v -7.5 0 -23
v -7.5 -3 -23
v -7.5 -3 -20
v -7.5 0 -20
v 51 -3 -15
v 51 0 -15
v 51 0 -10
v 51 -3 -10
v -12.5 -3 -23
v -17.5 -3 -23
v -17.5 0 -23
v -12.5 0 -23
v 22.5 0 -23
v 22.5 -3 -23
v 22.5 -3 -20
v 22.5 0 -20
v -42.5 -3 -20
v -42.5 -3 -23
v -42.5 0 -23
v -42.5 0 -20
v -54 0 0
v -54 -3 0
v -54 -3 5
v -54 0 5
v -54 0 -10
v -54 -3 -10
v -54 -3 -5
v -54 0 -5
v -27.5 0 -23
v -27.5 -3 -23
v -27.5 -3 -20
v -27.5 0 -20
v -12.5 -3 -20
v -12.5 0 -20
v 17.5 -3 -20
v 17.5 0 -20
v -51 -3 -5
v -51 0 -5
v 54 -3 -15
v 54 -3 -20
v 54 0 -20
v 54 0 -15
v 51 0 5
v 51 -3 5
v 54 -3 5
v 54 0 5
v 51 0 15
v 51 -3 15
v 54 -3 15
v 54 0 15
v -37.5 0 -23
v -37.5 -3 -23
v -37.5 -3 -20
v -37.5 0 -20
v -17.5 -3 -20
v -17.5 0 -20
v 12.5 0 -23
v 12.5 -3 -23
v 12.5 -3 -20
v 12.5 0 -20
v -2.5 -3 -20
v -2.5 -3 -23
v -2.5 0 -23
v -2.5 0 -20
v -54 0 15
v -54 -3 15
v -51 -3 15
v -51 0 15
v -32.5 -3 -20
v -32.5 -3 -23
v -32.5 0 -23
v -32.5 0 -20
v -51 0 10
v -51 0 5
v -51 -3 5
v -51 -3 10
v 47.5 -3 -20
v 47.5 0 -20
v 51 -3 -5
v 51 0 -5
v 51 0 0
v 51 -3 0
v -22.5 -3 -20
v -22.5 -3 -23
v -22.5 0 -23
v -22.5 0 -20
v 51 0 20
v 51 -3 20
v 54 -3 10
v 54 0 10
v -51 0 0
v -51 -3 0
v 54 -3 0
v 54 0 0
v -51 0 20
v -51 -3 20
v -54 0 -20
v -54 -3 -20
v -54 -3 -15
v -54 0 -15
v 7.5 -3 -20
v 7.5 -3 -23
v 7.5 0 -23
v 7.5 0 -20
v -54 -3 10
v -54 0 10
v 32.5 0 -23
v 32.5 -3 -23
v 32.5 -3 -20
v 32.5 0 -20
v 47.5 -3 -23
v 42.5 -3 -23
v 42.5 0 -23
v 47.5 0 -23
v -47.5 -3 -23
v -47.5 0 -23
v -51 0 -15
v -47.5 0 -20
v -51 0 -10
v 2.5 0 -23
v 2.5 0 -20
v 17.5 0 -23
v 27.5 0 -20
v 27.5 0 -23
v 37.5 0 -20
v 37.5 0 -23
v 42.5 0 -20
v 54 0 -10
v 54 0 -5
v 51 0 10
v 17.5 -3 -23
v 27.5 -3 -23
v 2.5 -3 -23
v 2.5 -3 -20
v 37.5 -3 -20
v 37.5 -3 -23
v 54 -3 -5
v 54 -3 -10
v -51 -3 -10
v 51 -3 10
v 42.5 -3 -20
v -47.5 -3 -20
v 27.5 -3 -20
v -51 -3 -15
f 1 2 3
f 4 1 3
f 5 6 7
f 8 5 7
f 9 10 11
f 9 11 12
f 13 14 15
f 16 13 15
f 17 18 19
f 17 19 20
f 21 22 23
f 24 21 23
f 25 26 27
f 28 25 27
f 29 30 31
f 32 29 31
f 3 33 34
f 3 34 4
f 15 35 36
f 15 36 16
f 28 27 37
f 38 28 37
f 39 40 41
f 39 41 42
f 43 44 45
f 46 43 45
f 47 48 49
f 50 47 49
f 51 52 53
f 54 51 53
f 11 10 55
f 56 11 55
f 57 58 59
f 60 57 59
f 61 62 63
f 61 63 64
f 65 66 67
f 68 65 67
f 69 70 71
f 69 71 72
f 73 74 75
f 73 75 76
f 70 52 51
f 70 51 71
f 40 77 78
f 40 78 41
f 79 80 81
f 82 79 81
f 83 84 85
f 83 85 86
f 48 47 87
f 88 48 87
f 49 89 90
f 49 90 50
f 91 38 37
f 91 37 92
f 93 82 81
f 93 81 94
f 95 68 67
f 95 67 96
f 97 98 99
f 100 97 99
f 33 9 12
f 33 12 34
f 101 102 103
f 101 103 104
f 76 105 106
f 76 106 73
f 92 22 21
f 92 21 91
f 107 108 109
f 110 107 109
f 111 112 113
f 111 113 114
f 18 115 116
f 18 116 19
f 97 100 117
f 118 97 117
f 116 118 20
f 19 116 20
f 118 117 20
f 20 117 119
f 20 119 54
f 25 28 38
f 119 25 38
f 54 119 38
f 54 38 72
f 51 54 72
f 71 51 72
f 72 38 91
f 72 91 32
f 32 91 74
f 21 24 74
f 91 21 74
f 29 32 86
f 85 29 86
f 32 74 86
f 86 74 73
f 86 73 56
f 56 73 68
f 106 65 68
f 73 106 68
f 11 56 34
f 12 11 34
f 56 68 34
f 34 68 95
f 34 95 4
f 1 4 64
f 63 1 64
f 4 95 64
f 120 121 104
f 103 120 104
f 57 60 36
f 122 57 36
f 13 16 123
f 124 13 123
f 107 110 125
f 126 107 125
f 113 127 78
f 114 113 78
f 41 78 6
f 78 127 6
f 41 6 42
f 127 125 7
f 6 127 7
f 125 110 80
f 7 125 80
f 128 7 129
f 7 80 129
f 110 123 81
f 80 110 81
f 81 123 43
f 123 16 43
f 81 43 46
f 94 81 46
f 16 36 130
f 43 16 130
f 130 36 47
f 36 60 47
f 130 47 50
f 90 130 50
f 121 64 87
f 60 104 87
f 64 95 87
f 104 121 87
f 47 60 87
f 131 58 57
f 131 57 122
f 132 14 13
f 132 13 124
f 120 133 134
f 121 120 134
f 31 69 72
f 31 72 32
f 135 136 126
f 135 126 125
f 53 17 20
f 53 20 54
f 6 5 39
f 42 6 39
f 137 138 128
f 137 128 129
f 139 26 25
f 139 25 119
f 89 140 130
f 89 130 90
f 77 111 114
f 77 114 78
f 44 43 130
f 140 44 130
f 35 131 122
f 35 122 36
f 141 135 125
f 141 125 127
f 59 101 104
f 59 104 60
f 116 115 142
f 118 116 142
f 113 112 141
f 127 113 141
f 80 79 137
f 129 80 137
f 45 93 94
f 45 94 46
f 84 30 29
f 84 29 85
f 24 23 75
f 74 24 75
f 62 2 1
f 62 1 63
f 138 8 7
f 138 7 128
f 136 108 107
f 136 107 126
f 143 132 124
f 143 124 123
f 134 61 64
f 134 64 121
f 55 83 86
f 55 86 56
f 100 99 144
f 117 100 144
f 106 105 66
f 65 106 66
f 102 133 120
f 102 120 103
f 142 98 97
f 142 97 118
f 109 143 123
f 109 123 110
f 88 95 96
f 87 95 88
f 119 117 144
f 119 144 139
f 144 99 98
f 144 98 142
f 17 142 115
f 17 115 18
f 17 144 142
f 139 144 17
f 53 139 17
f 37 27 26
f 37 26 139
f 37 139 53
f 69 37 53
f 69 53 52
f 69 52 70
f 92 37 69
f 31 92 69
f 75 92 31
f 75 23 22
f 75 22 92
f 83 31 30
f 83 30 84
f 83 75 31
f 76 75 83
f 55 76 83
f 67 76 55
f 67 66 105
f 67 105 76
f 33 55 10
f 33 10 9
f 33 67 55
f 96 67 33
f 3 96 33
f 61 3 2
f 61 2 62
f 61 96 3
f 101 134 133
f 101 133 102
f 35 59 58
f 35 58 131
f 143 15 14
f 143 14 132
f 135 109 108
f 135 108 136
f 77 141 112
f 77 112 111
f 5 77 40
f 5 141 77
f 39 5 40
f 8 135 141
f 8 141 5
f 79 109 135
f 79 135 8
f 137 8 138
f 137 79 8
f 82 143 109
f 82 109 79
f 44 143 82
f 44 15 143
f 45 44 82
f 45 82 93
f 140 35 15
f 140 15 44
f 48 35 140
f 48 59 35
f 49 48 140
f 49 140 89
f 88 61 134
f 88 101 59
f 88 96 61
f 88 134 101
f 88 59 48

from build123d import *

# Parameters (mm, degrees)
F0_W     = 102
F0_H     = 40
F1_DEPTH = 3
F2_W     = 3
F2_H     = 5
F3_DEPTH = 3
F4_W     = 5
F4_H     = 3
F5_DEPTH = 3


with BuildPart() as f1:
    # F0 (on Front) → F1 (new body)
    with BuildSketch(Plane.XZ):
        Rectangle(F0_W, F0_H)
    extrude(amount=F1_DEPTH)

    # F2 (on face) → F3 (join)
    with BuildSketch(Plane.XZ.offset(3)):
        with Locations((-52.5, -17.5)):
            Rectangle(F2_W, F2_H)
        with Locations((-52.5, -7.5)):
            Rectangle(F2_W, F2_H)
        with Locations((-52.5, 2.5)):
            Rectangle(F2_W, F2_H)
        with Locations((-52.5, 12.5)):
            Rectangle(F2_W, F2_H)
        with Locations((52.5, -7.5)):
            Rectangle(F2_W, F2_H)
        with Locations((52.5, -17.5)):
            Rectangle(F2_W, F2_H)
        with Locations((52.5, 12.5)):
            Rectangle(F2_W, F2_H)
        with Locations((52.5, 2.5)):
            Rectangle(F2_W, F2_H)
    extrude(amount=-F3_DEPTH)

    # F4 (on face) → F5 (join)
    with BuildSketch(Plane.XZ.offset(3)):
        with Locations((5, -21.5)):
            Rectangle(F4_W, F4_H)
        with Locations((15, -21.5)):
            Rectangle(F4_W, F4_H)
        with Locations((25, -21.5)):
            Rectangle(F4_W, F4_H)
        with Locations((35, -21.5)):
            Rectangle(F4_W, F4_H)
        with Locations((45, -21.5)):
            Rectangle(F4_W, F4_H)
        with Locations((-25, -21.5)):
            Rectangle(F4_W, F4_H)
        with Locations((-15, -21.5)):
            Rectangle(F4_W, F4_H)
        with Locations((-5, -21.5)):
            Rectangle(F4_W, F4_H)
        with Locations((-35, -21.5)):
            Rectangle(F4_W, F4_H)
        with Locations((-45, -21.5)):
            Rectangle(F4_W, F4_H)
    extrude(amount=-F5_DEPTH)


solid = f1.part
